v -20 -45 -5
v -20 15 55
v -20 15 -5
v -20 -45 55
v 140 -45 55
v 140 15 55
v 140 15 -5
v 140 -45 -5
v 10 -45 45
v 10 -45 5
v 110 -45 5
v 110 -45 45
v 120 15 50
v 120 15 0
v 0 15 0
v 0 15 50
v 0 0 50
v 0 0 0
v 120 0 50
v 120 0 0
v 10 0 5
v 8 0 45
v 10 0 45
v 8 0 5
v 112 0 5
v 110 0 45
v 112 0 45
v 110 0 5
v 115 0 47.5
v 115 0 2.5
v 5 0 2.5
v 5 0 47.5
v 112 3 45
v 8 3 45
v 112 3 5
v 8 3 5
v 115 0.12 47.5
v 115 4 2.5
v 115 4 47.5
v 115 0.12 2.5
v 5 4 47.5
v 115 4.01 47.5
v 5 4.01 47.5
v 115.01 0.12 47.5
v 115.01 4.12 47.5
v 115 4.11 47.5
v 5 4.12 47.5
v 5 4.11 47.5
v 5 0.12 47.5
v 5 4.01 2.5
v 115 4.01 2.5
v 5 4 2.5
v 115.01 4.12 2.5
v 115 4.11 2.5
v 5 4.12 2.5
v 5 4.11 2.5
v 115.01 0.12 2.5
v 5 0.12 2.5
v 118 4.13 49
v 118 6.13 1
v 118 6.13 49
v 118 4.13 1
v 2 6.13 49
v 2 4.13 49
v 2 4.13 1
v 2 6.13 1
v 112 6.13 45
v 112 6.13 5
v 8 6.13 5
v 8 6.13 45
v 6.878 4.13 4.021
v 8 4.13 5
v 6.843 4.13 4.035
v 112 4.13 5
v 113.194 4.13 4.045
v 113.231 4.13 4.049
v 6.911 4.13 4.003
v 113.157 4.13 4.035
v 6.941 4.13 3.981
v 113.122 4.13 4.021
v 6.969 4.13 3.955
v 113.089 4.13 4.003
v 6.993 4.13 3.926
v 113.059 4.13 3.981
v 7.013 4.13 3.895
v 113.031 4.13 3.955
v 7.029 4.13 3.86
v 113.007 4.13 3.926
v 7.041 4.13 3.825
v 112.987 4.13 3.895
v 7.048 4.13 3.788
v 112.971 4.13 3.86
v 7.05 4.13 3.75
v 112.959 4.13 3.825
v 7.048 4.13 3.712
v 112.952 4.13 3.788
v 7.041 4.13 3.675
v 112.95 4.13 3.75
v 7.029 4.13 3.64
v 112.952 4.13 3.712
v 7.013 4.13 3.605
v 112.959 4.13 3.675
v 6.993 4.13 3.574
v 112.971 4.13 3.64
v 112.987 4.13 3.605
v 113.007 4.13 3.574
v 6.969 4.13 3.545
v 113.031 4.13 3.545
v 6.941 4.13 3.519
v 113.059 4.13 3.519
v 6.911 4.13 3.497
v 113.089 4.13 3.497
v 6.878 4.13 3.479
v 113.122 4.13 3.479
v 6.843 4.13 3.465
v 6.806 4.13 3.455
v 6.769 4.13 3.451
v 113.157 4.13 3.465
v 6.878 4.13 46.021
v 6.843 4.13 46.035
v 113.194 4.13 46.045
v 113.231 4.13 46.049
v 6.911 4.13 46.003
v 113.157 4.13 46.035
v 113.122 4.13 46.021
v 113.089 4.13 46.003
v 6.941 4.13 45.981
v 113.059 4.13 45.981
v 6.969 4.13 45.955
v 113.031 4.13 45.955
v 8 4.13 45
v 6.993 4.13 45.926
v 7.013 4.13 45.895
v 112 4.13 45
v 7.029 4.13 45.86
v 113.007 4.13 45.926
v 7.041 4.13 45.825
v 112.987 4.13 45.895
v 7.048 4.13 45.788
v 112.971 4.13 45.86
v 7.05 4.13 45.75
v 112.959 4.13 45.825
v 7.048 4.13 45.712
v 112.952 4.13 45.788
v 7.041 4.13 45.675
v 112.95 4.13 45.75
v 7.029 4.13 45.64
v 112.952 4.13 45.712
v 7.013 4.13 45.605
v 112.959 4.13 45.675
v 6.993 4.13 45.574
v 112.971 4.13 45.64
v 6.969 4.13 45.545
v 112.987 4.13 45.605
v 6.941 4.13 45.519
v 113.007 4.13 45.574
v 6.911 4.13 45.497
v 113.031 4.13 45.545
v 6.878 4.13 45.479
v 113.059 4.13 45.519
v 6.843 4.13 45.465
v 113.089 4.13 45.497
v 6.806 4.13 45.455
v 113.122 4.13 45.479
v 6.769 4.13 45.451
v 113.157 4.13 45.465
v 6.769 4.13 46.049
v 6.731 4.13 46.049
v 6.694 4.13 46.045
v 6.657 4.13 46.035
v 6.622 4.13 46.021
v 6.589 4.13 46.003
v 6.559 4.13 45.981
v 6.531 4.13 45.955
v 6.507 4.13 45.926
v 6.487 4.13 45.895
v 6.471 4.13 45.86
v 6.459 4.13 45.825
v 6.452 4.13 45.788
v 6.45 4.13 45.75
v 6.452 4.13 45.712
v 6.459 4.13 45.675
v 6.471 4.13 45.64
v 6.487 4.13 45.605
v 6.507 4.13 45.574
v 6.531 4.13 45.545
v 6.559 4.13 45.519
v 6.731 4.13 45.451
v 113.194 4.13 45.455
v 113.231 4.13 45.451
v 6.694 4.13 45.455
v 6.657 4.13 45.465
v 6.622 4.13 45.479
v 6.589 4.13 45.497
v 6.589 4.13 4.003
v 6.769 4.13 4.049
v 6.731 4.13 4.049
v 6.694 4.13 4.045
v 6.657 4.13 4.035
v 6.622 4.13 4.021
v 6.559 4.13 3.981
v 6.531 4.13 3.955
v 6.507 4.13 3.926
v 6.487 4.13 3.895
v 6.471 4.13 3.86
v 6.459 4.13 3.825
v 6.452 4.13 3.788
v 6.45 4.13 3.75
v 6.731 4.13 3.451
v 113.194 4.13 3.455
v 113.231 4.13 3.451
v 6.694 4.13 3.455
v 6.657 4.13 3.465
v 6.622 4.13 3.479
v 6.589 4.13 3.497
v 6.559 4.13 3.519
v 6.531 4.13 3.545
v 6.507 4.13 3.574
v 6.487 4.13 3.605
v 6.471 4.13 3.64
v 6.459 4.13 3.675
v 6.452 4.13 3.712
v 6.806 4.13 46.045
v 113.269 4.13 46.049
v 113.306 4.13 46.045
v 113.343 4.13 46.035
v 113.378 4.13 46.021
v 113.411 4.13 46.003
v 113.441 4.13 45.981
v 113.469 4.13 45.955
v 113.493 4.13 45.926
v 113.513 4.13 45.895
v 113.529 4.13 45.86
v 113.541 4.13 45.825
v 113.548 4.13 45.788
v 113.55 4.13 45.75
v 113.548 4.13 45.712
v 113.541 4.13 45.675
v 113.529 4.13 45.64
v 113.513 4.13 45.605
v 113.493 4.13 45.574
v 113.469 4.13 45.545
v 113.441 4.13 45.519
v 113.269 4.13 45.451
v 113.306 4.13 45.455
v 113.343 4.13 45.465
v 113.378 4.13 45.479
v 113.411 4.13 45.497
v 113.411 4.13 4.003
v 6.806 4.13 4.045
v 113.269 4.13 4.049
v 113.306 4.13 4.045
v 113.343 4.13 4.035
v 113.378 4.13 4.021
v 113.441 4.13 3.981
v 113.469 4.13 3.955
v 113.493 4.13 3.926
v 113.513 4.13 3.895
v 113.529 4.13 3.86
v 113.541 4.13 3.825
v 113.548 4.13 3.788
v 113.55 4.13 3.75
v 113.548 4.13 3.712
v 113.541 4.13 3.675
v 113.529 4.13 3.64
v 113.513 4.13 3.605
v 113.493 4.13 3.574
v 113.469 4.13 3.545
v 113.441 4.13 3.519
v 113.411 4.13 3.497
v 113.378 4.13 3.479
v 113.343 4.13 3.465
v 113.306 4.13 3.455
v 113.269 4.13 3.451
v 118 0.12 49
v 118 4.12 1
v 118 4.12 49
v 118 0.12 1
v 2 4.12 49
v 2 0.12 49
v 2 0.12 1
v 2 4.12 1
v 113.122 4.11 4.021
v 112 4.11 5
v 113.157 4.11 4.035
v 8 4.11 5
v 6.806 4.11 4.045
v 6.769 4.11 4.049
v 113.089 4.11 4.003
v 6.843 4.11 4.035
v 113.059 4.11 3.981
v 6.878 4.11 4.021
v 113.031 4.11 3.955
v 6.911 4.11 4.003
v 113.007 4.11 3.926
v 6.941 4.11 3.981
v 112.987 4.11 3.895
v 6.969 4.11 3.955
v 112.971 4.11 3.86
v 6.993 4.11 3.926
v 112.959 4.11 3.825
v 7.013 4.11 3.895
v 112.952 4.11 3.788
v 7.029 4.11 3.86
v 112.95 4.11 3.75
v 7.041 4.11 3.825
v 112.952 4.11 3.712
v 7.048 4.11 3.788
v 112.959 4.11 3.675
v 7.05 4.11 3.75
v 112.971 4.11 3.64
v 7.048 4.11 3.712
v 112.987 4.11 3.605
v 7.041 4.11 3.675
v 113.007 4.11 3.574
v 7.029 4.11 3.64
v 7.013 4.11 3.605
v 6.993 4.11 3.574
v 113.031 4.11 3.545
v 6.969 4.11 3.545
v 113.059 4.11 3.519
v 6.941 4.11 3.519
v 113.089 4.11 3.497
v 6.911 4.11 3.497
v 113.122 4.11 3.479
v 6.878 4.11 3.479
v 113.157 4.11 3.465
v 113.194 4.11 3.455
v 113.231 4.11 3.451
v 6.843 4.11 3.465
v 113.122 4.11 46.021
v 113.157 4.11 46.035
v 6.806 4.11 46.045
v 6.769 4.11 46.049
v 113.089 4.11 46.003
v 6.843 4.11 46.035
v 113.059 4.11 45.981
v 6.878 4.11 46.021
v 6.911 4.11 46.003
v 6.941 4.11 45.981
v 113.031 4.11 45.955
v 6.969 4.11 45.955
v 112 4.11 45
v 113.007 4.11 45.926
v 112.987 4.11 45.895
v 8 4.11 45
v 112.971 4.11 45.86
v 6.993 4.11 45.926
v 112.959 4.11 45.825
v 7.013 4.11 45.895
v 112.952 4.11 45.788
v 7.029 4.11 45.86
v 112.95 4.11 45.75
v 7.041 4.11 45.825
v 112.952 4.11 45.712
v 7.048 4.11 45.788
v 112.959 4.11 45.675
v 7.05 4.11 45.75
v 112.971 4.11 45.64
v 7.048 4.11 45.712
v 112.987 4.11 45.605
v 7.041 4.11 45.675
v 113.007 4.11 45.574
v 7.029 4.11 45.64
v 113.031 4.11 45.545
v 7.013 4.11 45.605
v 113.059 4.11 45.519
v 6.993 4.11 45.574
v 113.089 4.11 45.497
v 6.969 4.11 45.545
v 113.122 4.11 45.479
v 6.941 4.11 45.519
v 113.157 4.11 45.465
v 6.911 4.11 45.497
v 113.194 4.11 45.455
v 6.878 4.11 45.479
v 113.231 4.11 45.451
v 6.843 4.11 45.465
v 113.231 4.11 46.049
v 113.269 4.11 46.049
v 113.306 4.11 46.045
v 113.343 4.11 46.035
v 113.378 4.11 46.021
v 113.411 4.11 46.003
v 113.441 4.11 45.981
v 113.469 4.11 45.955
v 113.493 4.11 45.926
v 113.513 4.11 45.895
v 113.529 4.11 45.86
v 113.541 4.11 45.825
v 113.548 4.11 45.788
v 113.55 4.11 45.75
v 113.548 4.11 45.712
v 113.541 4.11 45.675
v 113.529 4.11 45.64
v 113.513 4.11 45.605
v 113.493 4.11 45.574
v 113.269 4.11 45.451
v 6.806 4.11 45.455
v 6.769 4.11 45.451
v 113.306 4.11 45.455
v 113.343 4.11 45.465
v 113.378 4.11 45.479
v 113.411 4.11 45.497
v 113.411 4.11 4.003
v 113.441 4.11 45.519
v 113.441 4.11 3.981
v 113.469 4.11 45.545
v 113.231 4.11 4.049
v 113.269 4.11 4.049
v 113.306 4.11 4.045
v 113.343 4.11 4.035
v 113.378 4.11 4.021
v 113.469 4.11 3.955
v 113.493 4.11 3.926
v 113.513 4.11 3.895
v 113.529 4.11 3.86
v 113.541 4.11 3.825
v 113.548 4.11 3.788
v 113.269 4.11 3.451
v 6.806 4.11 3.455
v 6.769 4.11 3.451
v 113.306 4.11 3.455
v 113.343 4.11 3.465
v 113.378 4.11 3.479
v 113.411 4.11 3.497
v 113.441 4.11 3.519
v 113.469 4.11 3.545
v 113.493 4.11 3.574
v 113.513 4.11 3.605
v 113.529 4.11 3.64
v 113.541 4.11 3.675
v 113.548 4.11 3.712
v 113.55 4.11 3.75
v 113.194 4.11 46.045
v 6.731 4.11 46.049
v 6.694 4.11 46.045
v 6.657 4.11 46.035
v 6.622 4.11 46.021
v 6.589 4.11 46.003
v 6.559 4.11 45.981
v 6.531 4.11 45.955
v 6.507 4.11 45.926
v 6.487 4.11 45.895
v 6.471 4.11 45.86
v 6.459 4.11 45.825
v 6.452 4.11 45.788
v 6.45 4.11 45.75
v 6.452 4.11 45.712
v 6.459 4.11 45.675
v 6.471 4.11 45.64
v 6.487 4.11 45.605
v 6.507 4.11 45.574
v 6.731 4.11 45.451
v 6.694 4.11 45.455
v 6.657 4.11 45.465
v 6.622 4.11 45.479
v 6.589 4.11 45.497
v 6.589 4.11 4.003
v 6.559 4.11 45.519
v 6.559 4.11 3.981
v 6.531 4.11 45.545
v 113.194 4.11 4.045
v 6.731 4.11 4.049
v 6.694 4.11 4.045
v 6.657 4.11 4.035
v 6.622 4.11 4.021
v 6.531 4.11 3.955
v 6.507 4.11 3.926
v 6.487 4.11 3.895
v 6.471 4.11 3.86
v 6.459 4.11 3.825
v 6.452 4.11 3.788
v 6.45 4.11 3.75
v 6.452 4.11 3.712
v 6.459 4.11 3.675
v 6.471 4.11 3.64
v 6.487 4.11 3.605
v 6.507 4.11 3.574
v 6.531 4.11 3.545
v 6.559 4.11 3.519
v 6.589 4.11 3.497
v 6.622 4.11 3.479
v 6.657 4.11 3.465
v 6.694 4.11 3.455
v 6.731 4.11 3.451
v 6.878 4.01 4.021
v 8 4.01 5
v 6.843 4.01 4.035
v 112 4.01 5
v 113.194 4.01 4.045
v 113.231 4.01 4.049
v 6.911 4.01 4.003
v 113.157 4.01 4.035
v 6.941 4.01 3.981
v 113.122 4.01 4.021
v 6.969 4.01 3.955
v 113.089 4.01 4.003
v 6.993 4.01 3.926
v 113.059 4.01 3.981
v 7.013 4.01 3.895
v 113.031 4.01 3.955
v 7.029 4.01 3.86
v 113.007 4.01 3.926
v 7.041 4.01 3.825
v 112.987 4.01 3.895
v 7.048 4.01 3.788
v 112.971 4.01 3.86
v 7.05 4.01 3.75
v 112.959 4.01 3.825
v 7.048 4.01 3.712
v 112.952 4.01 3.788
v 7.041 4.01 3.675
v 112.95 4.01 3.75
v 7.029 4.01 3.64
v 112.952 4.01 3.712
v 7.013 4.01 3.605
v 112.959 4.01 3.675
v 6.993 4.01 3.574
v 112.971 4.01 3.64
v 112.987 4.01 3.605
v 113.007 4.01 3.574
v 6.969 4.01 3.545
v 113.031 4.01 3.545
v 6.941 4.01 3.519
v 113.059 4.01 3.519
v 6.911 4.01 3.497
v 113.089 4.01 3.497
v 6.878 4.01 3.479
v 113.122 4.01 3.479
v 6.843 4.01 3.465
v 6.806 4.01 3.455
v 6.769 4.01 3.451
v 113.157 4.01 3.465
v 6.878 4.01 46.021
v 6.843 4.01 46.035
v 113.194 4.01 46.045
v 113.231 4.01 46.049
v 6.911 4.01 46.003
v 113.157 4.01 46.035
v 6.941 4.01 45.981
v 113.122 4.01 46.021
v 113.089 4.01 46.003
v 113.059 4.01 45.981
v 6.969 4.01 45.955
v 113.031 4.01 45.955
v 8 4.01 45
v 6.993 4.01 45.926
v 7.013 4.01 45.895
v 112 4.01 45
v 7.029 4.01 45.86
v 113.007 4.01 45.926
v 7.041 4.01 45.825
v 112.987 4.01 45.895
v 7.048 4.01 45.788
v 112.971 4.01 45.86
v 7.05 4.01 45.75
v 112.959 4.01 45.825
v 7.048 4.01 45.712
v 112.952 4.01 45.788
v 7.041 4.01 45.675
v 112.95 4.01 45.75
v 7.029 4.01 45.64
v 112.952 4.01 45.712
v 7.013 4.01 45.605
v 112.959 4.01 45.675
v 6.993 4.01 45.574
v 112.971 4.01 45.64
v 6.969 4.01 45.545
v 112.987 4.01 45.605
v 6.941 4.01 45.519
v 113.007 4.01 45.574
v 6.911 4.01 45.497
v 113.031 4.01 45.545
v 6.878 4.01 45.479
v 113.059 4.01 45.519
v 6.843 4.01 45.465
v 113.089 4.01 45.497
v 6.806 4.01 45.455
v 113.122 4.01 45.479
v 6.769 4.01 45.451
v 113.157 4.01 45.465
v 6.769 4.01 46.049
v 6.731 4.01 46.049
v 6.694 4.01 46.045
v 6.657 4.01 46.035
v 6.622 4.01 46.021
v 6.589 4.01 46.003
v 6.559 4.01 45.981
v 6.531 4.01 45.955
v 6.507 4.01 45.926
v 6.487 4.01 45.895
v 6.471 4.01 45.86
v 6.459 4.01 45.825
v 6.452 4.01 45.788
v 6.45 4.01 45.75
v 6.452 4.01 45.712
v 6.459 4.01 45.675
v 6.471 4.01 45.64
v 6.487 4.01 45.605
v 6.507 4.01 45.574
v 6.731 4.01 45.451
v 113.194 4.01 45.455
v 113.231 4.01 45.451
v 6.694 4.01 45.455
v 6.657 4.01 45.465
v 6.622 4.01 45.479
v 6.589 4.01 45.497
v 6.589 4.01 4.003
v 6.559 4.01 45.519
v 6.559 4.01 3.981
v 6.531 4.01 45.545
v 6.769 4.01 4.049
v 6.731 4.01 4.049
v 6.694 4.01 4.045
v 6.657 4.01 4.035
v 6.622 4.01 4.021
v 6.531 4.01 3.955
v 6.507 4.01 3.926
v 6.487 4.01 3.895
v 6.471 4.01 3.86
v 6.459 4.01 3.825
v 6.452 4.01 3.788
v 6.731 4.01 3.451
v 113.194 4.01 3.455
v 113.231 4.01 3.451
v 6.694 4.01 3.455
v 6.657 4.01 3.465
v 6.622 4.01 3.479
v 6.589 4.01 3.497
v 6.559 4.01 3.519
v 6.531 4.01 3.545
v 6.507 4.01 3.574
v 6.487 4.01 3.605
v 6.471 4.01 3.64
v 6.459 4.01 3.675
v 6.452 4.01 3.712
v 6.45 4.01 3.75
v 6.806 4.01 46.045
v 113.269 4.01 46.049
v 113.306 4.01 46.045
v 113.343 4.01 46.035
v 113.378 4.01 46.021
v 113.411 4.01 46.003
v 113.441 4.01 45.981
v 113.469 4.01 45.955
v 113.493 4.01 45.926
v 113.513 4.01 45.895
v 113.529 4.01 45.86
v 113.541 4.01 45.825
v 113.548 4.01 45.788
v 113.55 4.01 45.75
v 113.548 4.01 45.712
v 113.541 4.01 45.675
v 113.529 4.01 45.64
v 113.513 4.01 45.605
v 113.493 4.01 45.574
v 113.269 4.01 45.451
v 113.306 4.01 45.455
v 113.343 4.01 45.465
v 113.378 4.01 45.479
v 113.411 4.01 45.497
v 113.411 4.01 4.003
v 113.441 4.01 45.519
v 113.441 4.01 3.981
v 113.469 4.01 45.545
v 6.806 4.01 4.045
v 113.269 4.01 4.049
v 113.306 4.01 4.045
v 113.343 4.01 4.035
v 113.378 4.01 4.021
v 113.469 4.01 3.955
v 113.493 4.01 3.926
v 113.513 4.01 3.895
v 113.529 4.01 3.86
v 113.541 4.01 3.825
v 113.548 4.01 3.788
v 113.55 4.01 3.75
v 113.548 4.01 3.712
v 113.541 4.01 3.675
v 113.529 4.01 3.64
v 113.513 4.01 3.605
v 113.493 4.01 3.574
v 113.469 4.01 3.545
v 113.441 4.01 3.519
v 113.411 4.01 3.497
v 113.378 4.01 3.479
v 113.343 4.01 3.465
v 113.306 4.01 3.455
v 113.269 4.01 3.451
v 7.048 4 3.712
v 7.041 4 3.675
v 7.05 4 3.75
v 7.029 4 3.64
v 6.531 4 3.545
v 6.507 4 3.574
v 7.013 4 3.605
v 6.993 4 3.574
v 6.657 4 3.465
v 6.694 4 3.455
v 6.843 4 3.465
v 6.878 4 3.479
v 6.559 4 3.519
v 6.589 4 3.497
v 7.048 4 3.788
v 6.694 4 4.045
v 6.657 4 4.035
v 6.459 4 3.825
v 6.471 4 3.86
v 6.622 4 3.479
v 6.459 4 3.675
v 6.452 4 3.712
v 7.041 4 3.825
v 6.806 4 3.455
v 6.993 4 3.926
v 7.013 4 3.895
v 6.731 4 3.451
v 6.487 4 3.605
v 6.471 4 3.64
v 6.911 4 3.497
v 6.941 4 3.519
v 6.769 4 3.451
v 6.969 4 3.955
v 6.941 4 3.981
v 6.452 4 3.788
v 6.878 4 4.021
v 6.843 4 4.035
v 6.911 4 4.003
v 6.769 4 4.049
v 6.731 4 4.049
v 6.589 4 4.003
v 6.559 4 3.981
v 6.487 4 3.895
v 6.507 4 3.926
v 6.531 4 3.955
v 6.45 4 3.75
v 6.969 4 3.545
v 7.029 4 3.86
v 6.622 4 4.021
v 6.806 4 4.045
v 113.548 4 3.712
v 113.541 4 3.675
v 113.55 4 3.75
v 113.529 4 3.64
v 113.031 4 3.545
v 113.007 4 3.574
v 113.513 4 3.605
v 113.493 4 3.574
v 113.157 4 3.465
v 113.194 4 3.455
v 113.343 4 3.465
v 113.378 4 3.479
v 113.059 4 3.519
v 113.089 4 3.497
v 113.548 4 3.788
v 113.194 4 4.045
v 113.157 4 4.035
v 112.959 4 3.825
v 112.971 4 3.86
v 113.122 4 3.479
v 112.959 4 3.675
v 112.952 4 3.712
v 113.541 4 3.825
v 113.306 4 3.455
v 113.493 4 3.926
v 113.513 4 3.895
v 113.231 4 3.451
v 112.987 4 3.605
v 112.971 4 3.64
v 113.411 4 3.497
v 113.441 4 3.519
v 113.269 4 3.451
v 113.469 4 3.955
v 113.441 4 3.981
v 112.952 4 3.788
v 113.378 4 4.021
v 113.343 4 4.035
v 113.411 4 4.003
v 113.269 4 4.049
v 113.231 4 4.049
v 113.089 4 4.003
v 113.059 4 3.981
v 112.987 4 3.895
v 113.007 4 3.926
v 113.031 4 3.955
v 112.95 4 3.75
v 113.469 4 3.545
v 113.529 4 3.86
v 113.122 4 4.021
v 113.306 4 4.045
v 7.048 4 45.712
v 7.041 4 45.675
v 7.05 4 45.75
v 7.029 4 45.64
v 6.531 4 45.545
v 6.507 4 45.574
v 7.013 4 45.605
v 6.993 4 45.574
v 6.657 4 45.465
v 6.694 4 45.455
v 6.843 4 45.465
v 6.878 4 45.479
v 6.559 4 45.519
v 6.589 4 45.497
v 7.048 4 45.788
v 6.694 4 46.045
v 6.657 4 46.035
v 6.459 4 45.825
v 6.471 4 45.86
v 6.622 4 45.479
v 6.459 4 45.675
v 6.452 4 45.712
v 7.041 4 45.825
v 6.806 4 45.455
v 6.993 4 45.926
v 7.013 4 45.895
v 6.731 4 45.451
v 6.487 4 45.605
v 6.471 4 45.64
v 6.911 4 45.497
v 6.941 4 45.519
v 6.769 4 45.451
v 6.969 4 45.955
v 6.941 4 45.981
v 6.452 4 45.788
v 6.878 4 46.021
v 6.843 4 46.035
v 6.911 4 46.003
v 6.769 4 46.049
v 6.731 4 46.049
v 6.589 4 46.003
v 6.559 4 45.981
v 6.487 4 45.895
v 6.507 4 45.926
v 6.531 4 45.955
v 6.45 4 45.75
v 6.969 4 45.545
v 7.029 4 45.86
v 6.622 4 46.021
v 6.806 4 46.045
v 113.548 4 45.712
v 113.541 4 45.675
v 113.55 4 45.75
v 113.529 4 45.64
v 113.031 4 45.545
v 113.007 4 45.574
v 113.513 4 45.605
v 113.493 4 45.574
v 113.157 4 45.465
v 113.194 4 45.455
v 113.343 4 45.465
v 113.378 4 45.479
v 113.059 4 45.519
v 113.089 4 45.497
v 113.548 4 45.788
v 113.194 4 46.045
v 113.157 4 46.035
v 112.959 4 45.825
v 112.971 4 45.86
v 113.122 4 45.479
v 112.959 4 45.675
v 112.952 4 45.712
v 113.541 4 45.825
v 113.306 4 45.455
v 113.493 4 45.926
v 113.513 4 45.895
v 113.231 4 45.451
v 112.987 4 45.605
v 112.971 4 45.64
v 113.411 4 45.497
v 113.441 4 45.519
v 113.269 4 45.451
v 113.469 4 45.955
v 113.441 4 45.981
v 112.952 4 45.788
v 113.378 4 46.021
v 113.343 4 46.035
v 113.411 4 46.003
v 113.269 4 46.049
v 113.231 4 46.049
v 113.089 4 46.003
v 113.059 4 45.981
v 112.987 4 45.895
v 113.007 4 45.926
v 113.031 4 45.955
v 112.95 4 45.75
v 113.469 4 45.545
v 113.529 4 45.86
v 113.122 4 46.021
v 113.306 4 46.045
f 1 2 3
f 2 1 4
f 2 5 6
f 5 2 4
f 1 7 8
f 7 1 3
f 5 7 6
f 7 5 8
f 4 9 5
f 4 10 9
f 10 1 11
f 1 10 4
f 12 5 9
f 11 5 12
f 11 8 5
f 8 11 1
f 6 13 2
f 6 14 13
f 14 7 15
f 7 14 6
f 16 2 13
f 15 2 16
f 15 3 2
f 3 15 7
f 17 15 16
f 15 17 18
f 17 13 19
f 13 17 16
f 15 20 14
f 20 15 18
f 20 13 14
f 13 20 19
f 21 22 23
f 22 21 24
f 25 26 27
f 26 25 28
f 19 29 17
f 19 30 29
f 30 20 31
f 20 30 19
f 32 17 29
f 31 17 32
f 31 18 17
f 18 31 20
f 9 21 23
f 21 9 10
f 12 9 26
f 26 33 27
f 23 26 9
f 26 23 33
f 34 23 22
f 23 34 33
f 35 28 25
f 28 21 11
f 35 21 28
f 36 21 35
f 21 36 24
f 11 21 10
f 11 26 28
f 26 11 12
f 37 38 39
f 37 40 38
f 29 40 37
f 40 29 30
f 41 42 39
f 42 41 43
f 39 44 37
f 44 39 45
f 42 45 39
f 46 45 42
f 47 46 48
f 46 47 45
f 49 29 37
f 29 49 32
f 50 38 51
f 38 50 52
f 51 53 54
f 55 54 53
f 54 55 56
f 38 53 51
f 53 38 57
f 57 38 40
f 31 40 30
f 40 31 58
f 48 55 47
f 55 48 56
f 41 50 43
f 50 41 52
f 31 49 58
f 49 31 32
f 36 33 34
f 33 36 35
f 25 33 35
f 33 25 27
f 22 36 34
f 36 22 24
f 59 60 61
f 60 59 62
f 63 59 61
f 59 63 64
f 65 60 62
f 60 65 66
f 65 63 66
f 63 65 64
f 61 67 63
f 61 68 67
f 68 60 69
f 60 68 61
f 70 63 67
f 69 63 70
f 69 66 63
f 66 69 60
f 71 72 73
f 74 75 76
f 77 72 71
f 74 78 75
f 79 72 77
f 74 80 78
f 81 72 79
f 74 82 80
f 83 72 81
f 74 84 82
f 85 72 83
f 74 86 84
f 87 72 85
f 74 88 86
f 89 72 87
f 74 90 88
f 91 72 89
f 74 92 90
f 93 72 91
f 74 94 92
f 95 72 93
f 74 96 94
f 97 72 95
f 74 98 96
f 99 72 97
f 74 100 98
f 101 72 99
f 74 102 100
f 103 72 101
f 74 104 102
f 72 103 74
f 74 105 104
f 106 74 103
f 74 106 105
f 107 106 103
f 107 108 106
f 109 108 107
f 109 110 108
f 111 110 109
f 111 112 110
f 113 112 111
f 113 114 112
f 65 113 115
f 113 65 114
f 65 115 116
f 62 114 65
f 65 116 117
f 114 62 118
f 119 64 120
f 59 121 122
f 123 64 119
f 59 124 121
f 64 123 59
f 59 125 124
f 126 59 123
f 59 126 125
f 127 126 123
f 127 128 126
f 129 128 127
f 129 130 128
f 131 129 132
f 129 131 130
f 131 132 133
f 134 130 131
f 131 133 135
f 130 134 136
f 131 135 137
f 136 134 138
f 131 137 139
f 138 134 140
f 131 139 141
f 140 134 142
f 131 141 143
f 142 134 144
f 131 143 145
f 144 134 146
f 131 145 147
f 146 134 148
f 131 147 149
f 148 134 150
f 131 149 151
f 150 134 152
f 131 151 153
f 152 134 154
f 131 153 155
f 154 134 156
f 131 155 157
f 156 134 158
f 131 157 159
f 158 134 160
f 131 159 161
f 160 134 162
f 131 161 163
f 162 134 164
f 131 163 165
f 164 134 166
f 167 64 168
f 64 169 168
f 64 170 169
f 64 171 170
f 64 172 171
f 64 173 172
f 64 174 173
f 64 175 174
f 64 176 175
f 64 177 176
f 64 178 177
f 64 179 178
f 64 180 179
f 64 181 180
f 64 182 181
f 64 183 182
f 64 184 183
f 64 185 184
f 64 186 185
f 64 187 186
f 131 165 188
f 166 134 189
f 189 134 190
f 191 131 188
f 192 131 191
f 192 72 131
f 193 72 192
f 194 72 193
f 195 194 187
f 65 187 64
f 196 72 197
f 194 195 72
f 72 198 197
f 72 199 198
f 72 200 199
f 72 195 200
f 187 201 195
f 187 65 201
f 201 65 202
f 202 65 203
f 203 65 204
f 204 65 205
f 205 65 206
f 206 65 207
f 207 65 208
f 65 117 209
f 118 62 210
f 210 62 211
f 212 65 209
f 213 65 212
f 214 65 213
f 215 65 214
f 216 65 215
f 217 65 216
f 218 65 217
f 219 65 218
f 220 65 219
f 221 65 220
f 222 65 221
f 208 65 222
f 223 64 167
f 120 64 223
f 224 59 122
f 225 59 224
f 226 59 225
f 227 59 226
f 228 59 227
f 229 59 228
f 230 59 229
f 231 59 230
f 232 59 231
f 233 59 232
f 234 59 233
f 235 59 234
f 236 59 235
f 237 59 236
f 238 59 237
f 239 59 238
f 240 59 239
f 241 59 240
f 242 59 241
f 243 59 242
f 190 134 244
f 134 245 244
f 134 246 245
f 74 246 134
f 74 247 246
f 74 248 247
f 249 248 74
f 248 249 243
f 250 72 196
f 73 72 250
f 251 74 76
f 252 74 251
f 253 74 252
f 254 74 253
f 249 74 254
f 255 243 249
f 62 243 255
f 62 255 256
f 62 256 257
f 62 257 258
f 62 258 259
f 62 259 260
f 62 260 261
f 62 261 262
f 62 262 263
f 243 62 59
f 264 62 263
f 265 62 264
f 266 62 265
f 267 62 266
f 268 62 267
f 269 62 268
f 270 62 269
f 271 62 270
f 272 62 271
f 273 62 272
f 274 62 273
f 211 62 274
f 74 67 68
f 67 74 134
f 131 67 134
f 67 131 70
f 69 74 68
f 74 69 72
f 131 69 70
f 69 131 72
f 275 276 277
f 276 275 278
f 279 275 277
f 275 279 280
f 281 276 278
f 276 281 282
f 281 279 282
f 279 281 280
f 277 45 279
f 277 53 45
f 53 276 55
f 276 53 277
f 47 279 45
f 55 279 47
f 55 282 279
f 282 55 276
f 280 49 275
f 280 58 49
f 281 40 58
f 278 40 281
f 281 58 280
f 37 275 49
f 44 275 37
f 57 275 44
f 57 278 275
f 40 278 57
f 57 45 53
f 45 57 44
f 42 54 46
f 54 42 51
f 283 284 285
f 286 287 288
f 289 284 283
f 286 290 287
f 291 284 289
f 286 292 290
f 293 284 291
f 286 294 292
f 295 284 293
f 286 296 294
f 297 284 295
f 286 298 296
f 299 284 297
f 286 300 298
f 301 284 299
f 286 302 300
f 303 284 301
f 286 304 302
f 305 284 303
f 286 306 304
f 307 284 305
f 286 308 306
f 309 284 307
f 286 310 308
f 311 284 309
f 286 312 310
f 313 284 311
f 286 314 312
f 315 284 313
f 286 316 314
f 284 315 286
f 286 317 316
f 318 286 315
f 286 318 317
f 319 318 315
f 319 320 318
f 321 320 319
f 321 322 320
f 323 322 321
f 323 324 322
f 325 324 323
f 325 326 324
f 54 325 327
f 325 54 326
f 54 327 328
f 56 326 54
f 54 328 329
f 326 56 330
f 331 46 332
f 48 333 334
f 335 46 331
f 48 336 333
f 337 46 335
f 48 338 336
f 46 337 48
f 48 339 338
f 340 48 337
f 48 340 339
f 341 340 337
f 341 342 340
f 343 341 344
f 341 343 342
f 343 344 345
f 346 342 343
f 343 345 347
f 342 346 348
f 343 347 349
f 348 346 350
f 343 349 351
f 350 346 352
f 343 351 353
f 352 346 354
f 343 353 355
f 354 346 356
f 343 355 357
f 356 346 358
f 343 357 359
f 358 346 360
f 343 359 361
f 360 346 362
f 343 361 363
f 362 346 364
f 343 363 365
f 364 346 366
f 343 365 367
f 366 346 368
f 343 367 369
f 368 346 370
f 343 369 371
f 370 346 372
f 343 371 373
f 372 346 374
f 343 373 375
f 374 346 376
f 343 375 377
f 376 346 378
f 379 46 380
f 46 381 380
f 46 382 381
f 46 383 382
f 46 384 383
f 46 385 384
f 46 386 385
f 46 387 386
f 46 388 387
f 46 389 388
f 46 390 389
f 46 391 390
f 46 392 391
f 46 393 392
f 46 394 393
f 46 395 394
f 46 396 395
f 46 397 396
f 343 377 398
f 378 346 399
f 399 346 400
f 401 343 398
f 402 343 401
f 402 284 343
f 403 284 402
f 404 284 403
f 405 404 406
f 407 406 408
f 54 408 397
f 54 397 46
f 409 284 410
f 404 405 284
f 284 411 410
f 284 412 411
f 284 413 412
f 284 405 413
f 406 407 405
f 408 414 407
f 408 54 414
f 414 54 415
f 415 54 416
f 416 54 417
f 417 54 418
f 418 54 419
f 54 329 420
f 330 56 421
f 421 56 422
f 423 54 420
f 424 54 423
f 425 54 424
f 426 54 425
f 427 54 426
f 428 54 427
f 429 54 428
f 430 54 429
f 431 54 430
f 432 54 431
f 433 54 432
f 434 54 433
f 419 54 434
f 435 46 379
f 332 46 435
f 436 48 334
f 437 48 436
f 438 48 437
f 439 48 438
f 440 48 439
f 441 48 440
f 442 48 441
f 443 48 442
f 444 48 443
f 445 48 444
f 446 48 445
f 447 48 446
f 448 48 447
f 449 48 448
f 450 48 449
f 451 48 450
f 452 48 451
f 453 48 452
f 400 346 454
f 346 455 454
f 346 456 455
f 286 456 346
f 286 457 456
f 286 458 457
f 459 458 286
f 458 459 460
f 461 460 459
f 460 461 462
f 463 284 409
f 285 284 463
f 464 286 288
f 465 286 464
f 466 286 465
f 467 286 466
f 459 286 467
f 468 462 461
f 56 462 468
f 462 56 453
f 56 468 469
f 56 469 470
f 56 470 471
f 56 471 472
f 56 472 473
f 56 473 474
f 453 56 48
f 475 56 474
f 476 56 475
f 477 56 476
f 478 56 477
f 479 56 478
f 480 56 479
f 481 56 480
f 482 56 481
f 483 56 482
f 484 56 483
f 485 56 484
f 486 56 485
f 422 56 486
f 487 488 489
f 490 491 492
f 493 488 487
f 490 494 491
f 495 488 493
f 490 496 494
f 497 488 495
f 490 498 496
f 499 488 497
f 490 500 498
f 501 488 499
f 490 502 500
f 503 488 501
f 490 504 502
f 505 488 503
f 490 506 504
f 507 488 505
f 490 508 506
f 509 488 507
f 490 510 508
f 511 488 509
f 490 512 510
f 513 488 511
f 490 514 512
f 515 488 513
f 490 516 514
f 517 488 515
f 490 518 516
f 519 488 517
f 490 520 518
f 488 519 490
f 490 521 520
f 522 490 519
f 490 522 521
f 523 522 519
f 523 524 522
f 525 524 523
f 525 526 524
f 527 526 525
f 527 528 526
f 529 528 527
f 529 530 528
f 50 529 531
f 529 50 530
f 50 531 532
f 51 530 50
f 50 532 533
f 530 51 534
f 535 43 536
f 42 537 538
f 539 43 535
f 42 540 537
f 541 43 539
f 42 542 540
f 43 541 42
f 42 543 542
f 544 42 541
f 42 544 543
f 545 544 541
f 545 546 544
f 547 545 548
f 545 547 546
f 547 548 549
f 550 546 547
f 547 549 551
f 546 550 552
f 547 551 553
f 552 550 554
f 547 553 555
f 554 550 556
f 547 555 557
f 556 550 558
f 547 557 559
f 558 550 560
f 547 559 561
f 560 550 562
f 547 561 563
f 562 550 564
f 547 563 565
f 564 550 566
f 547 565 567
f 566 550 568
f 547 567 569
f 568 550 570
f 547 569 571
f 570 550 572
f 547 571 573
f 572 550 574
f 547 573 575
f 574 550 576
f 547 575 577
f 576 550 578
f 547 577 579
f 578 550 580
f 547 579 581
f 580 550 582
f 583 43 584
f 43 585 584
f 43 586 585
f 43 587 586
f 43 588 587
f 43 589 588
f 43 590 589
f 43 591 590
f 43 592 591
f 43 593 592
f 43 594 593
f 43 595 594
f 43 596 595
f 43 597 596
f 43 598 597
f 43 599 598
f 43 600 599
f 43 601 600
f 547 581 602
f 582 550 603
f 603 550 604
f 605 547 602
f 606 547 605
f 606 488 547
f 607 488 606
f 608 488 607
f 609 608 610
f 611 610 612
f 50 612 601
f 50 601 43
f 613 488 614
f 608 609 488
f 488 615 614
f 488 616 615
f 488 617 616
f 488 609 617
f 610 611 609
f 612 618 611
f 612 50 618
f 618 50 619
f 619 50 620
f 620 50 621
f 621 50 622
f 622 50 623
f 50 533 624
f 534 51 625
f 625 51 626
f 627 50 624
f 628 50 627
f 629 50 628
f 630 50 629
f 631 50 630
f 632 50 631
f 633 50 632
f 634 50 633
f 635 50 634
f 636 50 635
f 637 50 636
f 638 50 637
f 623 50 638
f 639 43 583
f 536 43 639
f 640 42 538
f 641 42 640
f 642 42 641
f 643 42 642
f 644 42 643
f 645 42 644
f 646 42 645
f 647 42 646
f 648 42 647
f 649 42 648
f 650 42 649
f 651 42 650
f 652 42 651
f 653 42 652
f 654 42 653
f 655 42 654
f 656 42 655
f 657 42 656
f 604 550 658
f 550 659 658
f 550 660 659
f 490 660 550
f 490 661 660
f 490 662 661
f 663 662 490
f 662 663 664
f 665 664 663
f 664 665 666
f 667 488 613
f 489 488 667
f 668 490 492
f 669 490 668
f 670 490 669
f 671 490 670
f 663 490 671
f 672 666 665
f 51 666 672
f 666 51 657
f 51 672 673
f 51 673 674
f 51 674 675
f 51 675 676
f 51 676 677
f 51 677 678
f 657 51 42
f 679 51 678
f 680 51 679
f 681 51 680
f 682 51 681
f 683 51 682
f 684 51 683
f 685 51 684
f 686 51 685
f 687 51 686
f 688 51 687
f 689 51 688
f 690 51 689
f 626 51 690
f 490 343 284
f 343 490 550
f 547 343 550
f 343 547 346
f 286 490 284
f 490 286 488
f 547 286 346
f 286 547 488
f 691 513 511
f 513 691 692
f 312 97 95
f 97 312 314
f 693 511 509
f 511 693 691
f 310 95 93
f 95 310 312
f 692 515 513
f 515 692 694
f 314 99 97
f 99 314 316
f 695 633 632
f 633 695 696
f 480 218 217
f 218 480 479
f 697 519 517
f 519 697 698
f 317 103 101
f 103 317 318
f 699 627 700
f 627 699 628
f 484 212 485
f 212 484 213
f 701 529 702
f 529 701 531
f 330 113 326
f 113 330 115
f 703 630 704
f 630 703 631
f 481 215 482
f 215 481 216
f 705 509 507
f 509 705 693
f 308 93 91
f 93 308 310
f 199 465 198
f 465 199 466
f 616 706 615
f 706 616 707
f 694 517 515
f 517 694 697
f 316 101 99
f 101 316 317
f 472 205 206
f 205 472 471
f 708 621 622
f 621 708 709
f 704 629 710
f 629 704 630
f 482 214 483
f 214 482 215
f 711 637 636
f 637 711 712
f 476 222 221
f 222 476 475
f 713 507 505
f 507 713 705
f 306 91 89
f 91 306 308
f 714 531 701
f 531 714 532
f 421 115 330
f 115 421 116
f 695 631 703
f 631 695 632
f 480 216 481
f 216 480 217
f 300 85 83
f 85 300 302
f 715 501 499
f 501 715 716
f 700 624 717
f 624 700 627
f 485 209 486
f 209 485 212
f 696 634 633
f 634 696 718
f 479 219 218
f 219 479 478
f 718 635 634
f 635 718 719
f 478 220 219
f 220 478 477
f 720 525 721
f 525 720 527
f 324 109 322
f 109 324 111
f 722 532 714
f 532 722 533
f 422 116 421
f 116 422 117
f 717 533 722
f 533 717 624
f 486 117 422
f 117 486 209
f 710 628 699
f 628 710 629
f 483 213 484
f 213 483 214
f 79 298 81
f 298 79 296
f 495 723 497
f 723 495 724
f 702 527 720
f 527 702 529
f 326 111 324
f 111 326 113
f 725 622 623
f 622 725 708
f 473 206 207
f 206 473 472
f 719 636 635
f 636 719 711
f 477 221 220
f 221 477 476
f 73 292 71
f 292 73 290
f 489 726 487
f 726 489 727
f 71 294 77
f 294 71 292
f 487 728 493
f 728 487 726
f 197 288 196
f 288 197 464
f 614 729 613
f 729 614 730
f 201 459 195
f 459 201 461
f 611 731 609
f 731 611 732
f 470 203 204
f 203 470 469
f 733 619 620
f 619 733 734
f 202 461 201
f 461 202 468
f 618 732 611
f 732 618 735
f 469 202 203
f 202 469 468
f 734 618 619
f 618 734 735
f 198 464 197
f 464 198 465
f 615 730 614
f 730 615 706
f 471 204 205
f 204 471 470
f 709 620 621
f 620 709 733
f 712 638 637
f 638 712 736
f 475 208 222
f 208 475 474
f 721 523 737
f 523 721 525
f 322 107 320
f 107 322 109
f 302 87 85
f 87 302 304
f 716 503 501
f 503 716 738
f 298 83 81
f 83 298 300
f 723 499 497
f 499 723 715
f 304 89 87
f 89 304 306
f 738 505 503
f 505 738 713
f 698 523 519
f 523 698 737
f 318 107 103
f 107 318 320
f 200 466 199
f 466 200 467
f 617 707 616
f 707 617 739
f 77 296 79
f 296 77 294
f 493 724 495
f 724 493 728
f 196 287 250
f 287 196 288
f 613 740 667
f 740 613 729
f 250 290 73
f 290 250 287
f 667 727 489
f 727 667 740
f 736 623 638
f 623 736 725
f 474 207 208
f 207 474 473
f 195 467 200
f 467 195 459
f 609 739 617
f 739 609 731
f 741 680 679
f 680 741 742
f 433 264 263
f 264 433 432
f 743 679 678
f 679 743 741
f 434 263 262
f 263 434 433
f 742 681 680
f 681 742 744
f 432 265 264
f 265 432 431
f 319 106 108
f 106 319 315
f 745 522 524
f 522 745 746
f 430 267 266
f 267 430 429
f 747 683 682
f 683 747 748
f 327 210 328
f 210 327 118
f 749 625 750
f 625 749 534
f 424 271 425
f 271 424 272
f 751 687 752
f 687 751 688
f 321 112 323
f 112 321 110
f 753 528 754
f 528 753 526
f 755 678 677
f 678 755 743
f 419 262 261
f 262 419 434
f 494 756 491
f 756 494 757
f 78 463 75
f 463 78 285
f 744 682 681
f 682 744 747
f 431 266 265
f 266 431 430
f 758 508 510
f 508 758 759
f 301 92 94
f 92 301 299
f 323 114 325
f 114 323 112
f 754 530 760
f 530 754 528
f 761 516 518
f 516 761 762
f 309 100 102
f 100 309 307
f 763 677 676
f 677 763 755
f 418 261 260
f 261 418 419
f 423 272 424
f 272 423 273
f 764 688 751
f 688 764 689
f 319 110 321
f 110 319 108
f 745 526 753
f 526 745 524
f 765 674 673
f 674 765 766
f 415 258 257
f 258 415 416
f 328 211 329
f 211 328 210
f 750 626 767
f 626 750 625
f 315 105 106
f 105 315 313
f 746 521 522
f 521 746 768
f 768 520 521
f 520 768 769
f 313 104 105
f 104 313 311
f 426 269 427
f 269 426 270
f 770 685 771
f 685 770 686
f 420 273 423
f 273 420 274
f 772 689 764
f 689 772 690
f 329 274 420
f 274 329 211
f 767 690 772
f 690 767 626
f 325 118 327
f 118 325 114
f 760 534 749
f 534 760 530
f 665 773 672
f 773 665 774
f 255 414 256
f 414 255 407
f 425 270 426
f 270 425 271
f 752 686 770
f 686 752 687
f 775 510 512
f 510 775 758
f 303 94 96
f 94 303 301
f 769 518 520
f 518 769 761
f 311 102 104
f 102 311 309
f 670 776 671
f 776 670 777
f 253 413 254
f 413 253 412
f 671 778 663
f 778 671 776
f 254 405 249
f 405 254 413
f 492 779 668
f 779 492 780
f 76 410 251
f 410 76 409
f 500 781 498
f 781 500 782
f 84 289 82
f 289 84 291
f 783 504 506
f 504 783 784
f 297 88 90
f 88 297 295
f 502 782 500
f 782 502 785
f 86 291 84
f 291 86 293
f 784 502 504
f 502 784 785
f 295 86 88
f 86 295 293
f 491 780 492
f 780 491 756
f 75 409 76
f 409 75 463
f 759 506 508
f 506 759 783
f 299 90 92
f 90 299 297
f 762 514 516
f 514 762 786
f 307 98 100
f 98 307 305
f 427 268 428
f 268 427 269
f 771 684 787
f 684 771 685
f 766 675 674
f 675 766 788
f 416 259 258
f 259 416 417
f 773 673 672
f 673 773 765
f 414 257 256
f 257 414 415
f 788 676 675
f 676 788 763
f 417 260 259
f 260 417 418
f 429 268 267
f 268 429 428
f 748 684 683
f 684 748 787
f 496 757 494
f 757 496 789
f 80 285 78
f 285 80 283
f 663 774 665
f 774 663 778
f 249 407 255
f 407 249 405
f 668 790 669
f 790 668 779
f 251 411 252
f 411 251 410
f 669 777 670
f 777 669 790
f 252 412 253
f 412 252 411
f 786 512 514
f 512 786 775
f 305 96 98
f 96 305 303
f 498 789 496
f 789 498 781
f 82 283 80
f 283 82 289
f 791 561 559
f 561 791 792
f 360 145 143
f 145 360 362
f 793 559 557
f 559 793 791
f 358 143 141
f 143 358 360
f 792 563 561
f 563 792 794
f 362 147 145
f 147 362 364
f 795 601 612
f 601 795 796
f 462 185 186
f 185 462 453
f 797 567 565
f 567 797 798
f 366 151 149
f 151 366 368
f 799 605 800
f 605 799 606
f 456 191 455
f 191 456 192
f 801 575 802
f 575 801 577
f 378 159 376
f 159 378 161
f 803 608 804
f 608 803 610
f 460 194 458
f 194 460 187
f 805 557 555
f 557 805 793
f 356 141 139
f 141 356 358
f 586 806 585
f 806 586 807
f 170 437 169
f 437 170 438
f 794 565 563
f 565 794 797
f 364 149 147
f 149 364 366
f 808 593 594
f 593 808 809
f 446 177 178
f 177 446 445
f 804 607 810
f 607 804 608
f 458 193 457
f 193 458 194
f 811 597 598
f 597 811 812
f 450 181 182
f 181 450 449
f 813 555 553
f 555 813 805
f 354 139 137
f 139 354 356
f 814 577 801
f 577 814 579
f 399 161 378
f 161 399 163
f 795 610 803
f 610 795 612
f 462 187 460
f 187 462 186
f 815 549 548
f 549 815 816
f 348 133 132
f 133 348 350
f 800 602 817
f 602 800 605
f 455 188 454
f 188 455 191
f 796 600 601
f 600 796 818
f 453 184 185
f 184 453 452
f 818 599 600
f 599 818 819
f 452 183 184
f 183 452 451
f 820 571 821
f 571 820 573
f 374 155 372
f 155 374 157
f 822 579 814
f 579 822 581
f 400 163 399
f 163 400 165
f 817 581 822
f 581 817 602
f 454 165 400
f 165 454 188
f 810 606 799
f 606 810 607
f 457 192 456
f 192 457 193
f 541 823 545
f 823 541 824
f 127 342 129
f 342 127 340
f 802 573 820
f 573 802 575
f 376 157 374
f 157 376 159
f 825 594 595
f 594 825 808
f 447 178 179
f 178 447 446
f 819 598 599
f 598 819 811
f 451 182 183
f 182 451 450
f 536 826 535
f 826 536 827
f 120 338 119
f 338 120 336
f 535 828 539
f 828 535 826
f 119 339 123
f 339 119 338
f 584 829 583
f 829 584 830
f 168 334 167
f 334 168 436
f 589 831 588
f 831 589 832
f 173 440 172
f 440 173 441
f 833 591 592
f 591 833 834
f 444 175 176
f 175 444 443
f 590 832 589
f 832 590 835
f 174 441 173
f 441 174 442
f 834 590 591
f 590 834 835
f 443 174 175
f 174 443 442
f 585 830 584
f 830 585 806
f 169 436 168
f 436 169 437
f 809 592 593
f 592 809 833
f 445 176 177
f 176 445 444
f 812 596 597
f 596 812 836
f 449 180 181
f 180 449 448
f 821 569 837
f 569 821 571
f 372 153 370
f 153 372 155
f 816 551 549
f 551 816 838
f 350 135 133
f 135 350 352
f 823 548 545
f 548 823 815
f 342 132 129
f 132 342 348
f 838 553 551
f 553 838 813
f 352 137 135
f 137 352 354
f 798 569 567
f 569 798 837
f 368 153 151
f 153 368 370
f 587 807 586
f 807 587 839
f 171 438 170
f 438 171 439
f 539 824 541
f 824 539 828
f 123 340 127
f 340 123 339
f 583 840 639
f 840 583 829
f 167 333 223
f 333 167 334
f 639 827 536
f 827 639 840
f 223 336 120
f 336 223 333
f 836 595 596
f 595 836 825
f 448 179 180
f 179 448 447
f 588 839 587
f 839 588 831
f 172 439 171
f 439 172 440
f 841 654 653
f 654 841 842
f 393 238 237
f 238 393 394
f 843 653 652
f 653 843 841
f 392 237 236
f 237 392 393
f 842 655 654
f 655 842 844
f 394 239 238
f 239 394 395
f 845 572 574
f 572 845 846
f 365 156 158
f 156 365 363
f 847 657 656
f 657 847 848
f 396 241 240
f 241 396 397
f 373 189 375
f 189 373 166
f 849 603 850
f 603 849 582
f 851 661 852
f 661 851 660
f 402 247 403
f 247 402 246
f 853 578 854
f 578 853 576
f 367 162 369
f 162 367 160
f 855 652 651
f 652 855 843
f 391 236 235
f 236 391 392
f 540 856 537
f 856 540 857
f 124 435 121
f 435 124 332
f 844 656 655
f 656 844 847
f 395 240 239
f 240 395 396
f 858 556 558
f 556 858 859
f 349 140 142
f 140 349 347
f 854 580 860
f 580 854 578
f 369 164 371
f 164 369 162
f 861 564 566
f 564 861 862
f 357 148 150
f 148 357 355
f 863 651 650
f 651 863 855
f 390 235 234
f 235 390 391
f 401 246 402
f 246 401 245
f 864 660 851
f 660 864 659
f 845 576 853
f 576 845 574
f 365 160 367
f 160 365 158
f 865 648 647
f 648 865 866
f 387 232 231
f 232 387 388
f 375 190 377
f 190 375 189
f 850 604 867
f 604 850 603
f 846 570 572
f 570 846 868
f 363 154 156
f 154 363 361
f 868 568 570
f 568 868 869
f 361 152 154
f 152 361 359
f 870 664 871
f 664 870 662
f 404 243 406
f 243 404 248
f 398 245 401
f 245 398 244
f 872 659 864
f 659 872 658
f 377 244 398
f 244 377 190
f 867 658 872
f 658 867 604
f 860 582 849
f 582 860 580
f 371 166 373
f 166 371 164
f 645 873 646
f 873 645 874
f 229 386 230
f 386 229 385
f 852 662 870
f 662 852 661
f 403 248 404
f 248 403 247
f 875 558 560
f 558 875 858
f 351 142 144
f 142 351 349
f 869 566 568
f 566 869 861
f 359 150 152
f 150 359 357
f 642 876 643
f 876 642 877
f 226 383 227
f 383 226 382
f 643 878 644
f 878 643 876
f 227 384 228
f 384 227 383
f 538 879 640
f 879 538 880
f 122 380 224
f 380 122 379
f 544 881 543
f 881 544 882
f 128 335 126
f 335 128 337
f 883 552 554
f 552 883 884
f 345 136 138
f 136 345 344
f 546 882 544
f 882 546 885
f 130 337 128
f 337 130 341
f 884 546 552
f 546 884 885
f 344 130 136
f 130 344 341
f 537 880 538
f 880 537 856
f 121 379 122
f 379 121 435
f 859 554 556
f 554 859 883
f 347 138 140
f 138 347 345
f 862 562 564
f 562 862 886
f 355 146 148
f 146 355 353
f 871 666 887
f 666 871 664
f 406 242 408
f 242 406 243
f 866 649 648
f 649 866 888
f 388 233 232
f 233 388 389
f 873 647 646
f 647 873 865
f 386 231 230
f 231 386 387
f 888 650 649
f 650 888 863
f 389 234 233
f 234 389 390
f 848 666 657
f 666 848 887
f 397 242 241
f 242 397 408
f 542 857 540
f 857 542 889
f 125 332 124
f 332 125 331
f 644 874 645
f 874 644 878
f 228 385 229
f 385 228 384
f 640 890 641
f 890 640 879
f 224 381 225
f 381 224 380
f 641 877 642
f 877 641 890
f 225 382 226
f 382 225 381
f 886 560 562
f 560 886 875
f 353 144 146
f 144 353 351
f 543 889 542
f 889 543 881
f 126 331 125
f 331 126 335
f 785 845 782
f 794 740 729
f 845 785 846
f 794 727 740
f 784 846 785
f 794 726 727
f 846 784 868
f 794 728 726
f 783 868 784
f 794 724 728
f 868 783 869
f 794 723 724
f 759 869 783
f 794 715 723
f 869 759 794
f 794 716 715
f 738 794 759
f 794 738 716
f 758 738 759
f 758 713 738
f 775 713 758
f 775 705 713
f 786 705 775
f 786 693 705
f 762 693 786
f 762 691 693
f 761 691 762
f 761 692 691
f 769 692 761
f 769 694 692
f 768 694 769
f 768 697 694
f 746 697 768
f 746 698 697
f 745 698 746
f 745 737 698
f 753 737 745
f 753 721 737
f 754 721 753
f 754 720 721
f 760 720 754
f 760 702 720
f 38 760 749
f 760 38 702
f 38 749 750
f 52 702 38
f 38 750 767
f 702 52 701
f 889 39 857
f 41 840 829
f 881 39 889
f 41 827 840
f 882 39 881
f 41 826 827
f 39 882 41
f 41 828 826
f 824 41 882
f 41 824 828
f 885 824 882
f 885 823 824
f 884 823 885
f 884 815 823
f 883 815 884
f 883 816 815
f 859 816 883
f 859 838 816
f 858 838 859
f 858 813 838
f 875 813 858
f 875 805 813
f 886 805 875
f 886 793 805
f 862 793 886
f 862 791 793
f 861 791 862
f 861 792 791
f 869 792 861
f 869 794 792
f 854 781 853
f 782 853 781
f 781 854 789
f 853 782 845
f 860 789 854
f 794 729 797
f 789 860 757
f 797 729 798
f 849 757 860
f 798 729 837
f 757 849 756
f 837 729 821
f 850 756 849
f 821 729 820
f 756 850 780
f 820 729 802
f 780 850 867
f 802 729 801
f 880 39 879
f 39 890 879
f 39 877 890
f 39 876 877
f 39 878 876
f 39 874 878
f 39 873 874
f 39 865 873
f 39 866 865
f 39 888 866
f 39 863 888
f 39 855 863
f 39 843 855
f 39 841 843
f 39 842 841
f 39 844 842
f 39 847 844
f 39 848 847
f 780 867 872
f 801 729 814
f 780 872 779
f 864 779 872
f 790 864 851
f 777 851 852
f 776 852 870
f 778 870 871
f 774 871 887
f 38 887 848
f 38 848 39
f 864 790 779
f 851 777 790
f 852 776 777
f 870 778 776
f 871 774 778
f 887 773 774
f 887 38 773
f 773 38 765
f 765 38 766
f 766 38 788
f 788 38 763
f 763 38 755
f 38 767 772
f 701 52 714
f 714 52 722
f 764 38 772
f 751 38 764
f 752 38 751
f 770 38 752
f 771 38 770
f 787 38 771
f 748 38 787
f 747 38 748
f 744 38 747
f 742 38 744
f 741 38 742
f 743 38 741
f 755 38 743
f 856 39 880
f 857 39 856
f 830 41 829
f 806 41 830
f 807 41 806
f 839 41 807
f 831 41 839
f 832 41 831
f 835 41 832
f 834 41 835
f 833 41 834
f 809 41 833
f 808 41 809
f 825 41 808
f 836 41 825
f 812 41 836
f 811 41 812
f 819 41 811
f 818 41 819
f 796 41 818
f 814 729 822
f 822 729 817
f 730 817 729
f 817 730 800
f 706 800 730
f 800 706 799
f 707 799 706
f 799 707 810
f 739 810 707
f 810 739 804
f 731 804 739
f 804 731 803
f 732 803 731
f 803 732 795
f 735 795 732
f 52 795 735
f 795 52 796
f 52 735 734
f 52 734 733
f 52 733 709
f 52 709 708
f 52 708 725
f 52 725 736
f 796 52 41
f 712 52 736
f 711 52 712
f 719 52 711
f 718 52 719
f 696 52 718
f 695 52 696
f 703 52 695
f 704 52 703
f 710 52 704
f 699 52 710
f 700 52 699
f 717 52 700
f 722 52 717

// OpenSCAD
$fn=50;

module wall()
{
	color("white") difference()
	{
		cube([160, 60, 60]);
		translate([20, -0.1, 5]) cube([120, 15.1, 50]);
		translate([30, -5, 10]) cube([100, 70, 40]);
	}
}

module polystyrene()
{
	color("pink") difference()
	{
		cube([110, 3, 45]);
		translate([3, -1, 2.5]) cube([104, 5, 40]);
	}
}

module glass()
{
	color("skyblue",0.25) cube([110, 1, 45]);
}

module wood_frame()
{
	union()
	{
		color("SaddleBrown") translate([0, 4.01, 0]) difference()
		{
			cube([116, 2, 48]);
			translate([6, -1, 4]) cube([104, 5, 40]);
		}
		color("Sienna")difference()
		{
			cube([116, 4, 48]);
			translate([3, -1, 1.5]) cube([110.01, 5.01, 45]);
		}
	}
	
}

module soft_padding()
{
	color("Gainsboro") difference()
	{
		cube([110, 0.1, 45]);
		translate([3, -1, 2.5]) cube([104, 5, 40]);
	}
}

module screw()
{
	color("DimGray") rotate([-90, 0, 0]) union()
	{
		hull()
		{
			cylinder(d=1.2, h=0.1);
			translate([0,0,0.6]) cylinder(d=0.6, h=0.1);
		}
		cylinder(d=0.6, h=5);
	}	
}

translate([140, 15, -5]) rotate([0,0,180]) wall();
translate([5, 0, 2.5]) polystyrene();
translate([5, 3, 2.5]) glass();
translate([2, 0.12, 1]) wood_frame();
translate([5, 4.01, 2.5]) soft_padding();
translate([6.75, -0.01, 3.75]) screw();
translate([113.25, -0.01, 3.75]) screw();
translate([6.75, -0.01, 45.75]) screw();
translate([113.25, -0.01, 45.75]) screw();
